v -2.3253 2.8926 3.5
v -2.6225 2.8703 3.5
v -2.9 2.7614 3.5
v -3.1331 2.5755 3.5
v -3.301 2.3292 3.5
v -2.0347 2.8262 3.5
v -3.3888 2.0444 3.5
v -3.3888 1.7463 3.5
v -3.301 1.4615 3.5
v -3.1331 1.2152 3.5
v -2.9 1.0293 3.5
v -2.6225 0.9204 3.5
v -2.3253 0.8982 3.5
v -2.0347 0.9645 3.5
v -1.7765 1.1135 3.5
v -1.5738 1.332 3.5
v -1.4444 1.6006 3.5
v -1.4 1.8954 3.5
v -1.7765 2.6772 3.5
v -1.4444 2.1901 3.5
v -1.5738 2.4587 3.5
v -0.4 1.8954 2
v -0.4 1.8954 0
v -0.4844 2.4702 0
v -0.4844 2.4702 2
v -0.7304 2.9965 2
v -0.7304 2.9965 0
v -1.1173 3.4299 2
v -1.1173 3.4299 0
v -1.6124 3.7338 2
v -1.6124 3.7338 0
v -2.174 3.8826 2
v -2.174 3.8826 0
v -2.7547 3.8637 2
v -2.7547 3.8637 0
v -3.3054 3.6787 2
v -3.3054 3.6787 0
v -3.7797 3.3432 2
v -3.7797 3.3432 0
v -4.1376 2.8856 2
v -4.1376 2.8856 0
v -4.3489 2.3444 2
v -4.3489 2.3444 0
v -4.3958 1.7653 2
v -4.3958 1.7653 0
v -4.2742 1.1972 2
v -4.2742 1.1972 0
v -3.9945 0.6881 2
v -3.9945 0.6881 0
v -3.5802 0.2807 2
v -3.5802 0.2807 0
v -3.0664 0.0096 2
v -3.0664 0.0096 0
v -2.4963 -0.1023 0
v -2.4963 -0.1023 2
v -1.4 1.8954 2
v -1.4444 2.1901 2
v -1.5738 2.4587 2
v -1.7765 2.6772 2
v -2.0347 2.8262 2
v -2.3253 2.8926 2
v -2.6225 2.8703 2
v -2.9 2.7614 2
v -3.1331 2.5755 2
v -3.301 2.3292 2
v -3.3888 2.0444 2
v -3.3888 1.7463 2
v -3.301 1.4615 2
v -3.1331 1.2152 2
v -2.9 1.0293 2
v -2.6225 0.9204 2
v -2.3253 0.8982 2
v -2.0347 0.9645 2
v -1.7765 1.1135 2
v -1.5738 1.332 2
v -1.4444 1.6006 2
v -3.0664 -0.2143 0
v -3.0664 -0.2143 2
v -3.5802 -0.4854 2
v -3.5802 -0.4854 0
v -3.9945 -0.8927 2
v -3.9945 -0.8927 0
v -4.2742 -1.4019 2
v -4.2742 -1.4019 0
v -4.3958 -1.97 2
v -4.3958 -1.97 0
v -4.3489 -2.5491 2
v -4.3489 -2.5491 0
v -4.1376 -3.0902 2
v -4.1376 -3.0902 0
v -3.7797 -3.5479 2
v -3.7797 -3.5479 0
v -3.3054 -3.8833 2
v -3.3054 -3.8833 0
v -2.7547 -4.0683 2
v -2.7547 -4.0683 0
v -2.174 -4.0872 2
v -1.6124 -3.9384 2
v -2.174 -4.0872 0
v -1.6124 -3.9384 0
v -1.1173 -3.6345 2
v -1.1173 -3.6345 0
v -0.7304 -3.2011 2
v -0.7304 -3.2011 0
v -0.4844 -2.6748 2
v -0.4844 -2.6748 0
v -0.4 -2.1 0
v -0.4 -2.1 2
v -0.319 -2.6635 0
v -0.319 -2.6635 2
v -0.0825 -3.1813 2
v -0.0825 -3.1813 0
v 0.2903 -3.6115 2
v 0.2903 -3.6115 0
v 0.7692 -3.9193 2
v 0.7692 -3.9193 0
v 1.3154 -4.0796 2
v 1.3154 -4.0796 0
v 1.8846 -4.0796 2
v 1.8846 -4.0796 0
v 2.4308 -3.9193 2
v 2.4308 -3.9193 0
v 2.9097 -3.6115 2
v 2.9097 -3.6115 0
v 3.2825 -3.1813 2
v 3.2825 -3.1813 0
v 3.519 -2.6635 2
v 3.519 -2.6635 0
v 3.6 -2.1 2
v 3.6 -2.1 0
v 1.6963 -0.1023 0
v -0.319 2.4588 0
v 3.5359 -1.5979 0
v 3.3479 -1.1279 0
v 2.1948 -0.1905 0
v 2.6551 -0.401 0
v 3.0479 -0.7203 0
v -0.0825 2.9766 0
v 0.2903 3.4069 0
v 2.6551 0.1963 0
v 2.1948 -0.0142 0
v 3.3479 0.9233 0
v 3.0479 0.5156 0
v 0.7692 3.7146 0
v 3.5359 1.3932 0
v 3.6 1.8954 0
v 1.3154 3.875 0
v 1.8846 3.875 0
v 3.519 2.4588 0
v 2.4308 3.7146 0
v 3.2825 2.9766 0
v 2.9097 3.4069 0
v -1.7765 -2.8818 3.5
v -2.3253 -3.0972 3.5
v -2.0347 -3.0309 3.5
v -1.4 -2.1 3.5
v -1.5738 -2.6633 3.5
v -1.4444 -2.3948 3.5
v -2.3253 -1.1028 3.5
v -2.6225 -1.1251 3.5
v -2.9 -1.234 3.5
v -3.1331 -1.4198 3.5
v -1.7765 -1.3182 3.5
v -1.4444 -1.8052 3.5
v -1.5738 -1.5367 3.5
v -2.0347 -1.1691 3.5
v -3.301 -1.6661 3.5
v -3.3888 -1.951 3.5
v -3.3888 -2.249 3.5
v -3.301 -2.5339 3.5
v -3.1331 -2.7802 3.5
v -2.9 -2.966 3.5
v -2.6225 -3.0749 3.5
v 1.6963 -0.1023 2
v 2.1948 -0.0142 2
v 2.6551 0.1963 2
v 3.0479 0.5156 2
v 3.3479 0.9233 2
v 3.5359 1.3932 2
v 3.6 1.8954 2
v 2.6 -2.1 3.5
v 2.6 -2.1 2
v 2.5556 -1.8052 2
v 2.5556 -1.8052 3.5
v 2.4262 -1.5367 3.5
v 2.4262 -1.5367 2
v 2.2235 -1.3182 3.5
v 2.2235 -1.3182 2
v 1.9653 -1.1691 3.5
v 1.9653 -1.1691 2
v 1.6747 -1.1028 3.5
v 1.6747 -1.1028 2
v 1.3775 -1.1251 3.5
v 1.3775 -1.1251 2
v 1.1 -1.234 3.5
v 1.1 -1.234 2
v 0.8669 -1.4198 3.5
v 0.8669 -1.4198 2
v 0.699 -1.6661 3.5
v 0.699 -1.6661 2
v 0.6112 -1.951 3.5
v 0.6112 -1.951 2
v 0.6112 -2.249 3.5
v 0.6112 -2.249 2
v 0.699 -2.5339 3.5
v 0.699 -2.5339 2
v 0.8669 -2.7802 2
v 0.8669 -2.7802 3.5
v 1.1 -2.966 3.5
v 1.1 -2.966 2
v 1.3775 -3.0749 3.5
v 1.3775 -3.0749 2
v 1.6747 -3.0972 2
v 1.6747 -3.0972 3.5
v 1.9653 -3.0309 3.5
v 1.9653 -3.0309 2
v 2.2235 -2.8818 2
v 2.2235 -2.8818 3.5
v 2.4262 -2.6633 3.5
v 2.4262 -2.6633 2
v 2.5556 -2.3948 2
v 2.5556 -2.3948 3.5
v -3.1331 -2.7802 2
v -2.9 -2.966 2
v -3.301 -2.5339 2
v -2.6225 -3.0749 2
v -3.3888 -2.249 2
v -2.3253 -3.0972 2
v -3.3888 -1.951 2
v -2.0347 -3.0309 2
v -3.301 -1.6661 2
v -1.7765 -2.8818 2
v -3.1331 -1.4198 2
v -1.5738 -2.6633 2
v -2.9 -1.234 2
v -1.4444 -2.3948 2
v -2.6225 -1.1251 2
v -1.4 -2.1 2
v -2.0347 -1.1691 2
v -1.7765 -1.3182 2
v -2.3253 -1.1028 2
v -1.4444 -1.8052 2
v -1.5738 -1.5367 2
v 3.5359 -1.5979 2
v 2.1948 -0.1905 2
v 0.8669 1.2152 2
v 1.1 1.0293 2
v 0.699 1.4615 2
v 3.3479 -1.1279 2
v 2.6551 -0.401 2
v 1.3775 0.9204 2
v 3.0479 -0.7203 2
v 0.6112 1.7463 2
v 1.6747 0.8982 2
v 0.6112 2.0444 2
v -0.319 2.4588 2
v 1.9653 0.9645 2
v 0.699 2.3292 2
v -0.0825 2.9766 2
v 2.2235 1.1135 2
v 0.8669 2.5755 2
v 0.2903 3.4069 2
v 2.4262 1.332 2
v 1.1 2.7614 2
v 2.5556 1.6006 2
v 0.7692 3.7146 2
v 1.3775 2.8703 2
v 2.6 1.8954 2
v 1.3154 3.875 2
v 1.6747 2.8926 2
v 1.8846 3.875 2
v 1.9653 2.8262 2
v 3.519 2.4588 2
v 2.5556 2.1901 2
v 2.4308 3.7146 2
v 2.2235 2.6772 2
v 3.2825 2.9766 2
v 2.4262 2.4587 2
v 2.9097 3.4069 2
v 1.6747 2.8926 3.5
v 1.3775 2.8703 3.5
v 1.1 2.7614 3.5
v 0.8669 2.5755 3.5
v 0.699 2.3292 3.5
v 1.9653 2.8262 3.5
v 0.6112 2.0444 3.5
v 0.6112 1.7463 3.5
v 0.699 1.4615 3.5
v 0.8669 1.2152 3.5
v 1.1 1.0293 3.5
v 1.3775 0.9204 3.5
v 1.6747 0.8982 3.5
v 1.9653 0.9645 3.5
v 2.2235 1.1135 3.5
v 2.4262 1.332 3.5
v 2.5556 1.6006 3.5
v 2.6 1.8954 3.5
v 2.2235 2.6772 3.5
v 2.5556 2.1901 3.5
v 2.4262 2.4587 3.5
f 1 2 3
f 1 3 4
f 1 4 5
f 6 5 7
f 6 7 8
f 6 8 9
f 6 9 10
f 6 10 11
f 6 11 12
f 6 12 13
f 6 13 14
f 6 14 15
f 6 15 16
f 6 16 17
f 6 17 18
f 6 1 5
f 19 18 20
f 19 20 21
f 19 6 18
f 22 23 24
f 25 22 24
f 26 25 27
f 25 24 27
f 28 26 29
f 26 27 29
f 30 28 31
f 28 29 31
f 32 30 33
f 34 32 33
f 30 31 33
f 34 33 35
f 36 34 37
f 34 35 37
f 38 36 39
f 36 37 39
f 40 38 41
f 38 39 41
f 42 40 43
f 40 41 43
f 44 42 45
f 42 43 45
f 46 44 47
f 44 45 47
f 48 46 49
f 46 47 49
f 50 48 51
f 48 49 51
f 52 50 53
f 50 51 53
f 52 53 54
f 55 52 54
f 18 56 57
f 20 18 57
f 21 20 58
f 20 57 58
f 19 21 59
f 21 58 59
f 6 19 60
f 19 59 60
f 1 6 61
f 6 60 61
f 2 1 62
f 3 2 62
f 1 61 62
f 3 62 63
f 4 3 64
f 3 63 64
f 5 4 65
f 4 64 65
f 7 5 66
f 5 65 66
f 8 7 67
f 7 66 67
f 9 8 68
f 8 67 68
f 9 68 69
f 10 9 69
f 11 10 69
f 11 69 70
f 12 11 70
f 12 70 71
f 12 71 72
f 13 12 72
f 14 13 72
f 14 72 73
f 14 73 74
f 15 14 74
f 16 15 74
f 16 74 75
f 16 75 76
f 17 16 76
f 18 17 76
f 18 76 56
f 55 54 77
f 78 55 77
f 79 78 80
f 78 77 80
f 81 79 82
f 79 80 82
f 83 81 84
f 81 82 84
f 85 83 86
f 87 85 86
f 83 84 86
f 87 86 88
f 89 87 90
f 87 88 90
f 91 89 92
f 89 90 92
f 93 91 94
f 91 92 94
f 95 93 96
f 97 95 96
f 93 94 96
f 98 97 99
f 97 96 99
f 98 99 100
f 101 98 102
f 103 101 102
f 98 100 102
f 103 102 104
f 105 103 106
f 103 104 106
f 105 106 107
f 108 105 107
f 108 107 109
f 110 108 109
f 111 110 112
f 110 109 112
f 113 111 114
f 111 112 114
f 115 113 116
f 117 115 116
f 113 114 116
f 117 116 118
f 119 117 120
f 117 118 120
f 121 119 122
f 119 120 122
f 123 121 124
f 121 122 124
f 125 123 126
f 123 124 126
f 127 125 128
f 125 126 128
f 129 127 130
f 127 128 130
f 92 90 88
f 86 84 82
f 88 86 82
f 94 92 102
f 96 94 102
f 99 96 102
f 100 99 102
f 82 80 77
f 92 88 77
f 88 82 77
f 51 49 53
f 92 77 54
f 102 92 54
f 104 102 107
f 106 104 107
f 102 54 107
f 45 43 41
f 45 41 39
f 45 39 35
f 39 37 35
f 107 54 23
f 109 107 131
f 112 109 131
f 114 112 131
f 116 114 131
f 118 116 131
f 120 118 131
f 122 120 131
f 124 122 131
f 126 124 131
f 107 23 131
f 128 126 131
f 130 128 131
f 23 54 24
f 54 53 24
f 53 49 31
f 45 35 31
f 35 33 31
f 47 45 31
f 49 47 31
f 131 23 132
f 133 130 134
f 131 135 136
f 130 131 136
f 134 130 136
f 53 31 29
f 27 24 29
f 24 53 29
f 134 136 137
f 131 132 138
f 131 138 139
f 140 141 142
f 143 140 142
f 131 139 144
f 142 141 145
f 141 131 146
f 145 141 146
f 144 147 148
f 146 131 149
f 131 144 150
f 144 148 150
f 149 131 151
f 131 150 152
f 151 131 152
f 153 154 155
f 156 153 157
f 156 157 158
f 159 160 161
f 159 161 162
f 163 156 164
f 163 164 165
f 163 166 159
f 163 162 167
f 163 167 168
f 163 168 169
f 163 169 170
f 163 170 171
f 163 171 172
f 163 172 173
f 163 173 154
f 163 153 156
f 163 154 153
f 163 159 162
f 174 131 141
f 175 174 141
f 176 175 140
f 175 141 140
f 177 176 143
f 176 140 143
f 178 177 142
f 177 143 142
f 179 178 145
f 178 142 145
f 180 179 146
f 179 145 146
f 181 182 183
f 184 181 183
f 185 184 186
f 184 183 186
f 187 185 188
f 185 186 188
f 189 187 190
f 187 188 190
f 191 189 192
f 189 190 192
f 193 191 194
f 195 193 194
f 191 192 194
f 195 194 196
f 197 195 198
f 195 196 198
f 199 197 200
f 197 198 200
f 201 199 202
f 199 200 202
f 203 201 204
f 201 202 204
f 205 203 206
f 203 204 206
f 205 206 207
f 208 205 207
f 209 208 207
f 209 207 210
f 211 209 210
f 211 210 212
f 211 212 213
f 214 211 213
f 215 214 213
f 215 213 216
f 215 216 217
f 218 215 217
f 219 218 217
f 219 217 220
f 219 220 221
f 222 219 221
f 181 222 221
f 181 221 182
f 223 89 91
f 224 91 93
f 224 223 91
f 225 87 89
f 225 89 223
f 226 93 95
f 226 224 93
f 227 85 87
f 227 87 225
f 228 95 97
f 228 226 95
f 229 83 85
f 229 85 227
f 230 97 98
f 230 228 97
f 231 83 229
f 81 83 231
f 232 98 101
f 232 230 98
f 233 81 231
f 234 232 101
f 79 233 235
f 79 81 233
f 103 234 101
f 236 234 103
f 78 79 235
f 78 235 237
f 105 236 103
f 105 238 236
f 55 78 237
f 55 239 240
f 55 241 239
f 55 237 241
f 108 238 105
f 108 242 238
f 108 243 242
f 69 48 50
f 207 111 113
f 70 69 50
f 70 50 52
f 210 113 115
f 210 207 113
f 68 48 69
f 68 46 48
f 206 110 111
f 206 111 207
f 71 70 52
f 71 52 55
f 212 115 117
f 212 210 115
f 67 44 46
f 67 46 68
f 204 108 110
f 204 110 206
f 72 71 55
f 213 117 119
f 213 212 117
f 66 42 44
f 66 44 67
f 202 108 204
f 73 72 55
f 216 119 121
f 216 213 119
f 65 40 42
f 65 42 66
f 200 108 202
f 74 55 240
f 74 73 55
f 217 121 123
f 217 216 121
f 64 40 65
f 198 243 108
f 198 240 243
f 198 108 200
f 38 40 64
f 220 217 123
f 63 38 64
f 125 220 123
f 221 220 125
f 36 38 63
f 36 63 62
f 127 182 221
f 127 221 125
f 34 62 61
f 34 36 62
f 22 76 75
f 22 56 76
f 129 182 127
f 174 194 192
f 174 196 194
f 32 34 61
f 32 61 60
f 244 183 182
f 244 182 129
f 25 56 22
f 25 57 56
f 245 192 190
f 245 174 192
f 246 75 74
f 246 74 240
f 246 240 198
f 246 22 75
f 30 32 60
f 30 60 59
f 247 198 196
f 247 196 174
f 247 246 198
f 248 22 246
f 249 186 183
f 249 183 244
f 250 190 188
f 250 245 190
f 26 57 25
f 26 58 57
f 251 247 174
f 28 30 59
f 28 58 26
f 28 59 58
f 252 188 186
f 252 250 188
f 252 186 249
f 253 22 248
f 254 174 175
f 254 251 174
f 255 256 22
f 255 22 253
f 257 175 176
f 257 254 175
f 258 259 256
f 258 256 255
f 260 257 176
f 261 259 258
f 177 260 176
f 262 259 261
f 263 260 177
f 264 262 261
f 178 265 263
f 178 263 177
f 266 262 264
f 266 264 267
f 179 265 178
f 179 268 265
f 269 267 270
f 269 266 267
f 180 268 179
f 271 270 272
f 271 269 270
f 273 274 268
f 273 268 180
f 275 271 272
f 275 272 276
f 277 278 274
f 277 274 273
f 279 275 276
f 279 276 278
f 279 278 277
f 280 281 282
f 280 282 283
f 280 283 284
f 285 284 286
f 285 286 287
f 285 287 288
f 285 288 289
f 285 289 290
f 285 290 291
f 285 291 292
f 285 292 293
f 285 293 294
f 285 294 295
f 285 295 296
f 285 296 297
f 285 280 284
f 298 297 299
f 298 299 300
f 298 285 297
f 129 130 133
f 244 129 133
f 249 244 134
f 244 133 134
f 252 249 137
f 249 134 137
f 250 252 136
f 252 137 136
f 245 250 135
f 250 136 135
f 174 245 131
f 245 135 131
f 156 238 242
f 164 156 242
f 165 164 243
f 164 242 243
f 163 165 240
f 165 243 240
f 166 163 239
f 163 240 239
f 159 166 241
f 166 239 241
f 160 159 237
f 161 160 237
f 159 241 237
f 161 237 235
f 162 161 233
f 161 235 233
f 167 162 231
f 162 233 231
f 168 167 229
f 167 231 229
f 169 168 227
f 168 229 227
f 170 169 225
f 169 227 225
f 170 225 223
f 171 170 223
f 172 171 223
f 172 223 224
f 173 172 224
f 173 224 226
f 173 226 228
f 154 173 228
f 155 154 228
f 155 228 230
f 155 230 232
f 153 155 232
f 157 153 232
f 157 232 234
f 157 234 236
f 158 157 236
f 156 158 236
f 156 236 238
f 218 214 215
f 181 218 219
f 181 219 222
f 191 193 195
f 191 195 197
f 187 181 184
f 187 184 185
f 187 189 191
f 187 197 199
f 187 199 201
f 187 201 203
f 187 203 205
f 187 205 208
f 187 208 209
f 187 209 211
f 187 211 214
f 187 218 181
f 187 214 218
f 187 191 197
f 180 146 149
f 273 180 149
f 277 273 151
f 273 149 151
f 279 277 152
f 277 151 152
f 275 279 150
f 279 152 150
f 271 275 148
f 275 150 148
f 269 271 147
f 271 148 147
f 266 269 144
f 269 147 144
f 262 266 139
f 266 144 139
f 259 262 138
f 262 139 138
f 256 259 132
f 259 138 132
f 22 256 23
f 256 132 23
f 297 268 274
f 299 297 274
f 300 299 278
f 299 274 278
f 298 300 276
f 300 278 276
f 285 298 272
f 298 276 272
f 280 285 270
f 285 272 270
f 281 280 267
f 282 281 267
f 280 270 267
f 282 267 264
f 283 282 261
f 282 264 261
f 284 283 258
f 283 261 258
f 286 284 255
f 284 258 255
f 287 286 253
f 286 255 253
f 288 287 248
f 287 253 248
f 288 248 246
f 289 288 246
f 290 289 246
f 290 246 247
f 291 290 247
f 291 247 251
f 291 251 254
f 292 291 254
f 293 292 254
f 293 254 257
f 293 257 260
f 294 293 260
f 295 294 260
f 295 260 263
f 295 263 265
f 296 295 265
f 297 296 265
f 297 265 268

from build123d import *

# Parameters (mm, degrees)
F0_R     = 1
F1_DEPTH = 3.5
F2_DEPTH = 2
F3_DEPTH = 2


with BuildPart() as f1:
    # F0 (on Top) → F1 (new body)
    with BuildSketch(Plane.XY):
        with Locations((-2.3999998812, 1.8953582125)):
            Circle(F0_R)
    extrude(amount=F1_DEPTH)



with BuildPart() as f1b:
    # F0 (on Top) → F1, piece 2 (new body)
    with BuildSketch(Plane.XY):
        with Locations((1.6000001188, 1.8953582125)):
            Circle(F0_R)
    extrude(amount=F1_DEPTH)


with BuildPart() as f1c:
    # F0 (on Top) → F1, piece 3 (new body)
    with BuildSketch(Plane.XY):
        with Locations((1.6000001188, -2.0999999251)):
            Circle(F0_R)
    extrude(amount=F1_DEPTH)


with BuildPart() as f1d:
    # F0 (on Top) → F1, piece 4 (new body)
    with BuildSketch(Plane.XY):
        with Locations((-2.3999998812, -2.0999999251)):
            Circle(F0_R)
    extrude(amount=F1_DEPTH)


with BuildPart() as f1_1:
    add(f1.part)

    add(f1d.part)  # F2 merges F1d
    # F0 (on Top) → F2 (join)
    with BuildSketch(Plane.XY):
        with BuildLine():
            ThreePointArc((-2.4963240114, -0.1023208563), (-3.7797374902, -3.5478687487), (-0.3999998812, -2.0999999251))
            ThreePointArc((-0.3999998812, -2.0999999251), (-0.9521310576, -0.7202623161), (-2.3036757509, -0.1023208563))
            ThreePointArc((-2.3036757509, -0.1023208563), (-2.3999998812, -0.1046417875), (-2.4963240114, -0.1023208563))
        make_face()
        with Locations((-2.3999998812, -2.0999999251)):
            Circle(F0_R, mode=Mode.SUBTRACT)
        with BuildLine():
            ThreePointArc((-2.4963240114, -0.1023208563), (-2.3999998812, -0.1046417875), (-2.3036757509, -0.1023208563))
            ThreePointArc((-2.3036757509, -0.1023208563), (-2.3999998812, -0.0999999251), (-2.4963240114, -0.1023208563))
        make_face()
        with BuildLine():
            ThreePointArc((-2.4963240114, -0.1023208563), (-2.3999998812, -0.0999999251), (-2.3036757509, -0.1023208563))
            ThreePointArc((-2.3036757509, -0.1023208563), (-0.9521310576, 0.5156206035), (-0.3999998812, 1.8953582125))
            ThreePointArc((-0.3999998812, 1.8953582125), (-3.7797374902, 3.343227036), (-2.4963240114, -0.1023208563))
        make_face()
        with Locations((-2.3999998812, 1.8953582125)):
            Circle(F0_R, mode=Mode.SUBTRACT)
    extrude(amount=F2_DEPTH)


    add(f1b.part)  # F2#2 merges F1b

    add(f1c.part)  # F2#2 merges F1c
    # F0 (on Top) → F2, piece 2 (join)
    with BuildSketch(Plane.XY):
        with BuildLine():
            ThreePointArc((1.5036759886, -0.1023208563), (0.1521312953, -0.7202623161), (-0.3999998812, -2.0999999251))
            ThreePointArc((-0.3999998812, -2.0999999251), (1.6000001188, -4.0999999251), (3.6000001188, -2.0999999251))
            ThreePointArc((3.6000001188, -2.0999999251), (3.0478689424, -0.7202623161), (1.6963242491, -0.1023208563))
            ThreePointArc((1.6963242491, -0.1023208563), (1.6000001188, -0.1046417875), (1.5036759886, -0.1023208563))
        make_face()
        with Locations((1.6000001188, -2.0999999251)):
            Circle(F0_R, mode=Mode.SUBTRACT)
        with BuildLine():
            ThreePointArc((-0.3999998812, 1.8953582125), (0.1521312953, 0.5156206035), (1.5036759886, -0.1023208563))
            ThreePointArc((1.5036759886, -0.1023208563), (1.6000001188, -0.0999999251), (1.6963242491, -0.1023208563))
            ThreePointArc((1.6963242491, -0.1023208563), (3.0478689424, 0.5156206035), (3.6000001188, 1.8953582125))
            ThreePointArc((3.6000001188, 1.8953582125), (1.6000001188, 3.8953582125), (-0.3999998812, 1.8953582125))
        make_face()
        with Locations((1.6000001188, 1.8953582125)):
            Circle(F0_R, mode=Mode.SUBTRACT)
        with BuildLine():
            ThreePointArc((1.6963242491, -0.1023208563), (1.6000001188, -0.0999999251), (1.5036759886, -0.1023208563))
            ThreePointArc((1.5036759886, -0.1023208563), (1.6000001188, -0.1046417875), (1.6963242491, -0.1023208563))
        make_face()
    extrude(amount=F2_DEPTH)

    # F0 (on Top) → F3 (join)
    with BuildSketch(Plane.XY):
        with BuildLine():
            ThreePointArc((-2.3036757509, -0.1023208563), (-0.9521310576, -0.7202623161), (-0.3999998812, -2.0999999251))
            ThreePointArc((-0.3999998812, -2.0999999251), (0.1521312953, -0.7202623161), (1.5036759886, -0.1023208563))
            ThreePointArc((1.5036759886, -0.1023208563), (0.1521312953, 0.5156206035), (-0.3999998812, 1.8953582125))
            ThreePointArc((-0.3999998812, 1.8953582125), (-0.9521310576, 0.5156206035), (-2.3036757509, -0.1023208563))
        make_face()
    extrude(amount=F3_DEPTH)


solid = f1_1.part
